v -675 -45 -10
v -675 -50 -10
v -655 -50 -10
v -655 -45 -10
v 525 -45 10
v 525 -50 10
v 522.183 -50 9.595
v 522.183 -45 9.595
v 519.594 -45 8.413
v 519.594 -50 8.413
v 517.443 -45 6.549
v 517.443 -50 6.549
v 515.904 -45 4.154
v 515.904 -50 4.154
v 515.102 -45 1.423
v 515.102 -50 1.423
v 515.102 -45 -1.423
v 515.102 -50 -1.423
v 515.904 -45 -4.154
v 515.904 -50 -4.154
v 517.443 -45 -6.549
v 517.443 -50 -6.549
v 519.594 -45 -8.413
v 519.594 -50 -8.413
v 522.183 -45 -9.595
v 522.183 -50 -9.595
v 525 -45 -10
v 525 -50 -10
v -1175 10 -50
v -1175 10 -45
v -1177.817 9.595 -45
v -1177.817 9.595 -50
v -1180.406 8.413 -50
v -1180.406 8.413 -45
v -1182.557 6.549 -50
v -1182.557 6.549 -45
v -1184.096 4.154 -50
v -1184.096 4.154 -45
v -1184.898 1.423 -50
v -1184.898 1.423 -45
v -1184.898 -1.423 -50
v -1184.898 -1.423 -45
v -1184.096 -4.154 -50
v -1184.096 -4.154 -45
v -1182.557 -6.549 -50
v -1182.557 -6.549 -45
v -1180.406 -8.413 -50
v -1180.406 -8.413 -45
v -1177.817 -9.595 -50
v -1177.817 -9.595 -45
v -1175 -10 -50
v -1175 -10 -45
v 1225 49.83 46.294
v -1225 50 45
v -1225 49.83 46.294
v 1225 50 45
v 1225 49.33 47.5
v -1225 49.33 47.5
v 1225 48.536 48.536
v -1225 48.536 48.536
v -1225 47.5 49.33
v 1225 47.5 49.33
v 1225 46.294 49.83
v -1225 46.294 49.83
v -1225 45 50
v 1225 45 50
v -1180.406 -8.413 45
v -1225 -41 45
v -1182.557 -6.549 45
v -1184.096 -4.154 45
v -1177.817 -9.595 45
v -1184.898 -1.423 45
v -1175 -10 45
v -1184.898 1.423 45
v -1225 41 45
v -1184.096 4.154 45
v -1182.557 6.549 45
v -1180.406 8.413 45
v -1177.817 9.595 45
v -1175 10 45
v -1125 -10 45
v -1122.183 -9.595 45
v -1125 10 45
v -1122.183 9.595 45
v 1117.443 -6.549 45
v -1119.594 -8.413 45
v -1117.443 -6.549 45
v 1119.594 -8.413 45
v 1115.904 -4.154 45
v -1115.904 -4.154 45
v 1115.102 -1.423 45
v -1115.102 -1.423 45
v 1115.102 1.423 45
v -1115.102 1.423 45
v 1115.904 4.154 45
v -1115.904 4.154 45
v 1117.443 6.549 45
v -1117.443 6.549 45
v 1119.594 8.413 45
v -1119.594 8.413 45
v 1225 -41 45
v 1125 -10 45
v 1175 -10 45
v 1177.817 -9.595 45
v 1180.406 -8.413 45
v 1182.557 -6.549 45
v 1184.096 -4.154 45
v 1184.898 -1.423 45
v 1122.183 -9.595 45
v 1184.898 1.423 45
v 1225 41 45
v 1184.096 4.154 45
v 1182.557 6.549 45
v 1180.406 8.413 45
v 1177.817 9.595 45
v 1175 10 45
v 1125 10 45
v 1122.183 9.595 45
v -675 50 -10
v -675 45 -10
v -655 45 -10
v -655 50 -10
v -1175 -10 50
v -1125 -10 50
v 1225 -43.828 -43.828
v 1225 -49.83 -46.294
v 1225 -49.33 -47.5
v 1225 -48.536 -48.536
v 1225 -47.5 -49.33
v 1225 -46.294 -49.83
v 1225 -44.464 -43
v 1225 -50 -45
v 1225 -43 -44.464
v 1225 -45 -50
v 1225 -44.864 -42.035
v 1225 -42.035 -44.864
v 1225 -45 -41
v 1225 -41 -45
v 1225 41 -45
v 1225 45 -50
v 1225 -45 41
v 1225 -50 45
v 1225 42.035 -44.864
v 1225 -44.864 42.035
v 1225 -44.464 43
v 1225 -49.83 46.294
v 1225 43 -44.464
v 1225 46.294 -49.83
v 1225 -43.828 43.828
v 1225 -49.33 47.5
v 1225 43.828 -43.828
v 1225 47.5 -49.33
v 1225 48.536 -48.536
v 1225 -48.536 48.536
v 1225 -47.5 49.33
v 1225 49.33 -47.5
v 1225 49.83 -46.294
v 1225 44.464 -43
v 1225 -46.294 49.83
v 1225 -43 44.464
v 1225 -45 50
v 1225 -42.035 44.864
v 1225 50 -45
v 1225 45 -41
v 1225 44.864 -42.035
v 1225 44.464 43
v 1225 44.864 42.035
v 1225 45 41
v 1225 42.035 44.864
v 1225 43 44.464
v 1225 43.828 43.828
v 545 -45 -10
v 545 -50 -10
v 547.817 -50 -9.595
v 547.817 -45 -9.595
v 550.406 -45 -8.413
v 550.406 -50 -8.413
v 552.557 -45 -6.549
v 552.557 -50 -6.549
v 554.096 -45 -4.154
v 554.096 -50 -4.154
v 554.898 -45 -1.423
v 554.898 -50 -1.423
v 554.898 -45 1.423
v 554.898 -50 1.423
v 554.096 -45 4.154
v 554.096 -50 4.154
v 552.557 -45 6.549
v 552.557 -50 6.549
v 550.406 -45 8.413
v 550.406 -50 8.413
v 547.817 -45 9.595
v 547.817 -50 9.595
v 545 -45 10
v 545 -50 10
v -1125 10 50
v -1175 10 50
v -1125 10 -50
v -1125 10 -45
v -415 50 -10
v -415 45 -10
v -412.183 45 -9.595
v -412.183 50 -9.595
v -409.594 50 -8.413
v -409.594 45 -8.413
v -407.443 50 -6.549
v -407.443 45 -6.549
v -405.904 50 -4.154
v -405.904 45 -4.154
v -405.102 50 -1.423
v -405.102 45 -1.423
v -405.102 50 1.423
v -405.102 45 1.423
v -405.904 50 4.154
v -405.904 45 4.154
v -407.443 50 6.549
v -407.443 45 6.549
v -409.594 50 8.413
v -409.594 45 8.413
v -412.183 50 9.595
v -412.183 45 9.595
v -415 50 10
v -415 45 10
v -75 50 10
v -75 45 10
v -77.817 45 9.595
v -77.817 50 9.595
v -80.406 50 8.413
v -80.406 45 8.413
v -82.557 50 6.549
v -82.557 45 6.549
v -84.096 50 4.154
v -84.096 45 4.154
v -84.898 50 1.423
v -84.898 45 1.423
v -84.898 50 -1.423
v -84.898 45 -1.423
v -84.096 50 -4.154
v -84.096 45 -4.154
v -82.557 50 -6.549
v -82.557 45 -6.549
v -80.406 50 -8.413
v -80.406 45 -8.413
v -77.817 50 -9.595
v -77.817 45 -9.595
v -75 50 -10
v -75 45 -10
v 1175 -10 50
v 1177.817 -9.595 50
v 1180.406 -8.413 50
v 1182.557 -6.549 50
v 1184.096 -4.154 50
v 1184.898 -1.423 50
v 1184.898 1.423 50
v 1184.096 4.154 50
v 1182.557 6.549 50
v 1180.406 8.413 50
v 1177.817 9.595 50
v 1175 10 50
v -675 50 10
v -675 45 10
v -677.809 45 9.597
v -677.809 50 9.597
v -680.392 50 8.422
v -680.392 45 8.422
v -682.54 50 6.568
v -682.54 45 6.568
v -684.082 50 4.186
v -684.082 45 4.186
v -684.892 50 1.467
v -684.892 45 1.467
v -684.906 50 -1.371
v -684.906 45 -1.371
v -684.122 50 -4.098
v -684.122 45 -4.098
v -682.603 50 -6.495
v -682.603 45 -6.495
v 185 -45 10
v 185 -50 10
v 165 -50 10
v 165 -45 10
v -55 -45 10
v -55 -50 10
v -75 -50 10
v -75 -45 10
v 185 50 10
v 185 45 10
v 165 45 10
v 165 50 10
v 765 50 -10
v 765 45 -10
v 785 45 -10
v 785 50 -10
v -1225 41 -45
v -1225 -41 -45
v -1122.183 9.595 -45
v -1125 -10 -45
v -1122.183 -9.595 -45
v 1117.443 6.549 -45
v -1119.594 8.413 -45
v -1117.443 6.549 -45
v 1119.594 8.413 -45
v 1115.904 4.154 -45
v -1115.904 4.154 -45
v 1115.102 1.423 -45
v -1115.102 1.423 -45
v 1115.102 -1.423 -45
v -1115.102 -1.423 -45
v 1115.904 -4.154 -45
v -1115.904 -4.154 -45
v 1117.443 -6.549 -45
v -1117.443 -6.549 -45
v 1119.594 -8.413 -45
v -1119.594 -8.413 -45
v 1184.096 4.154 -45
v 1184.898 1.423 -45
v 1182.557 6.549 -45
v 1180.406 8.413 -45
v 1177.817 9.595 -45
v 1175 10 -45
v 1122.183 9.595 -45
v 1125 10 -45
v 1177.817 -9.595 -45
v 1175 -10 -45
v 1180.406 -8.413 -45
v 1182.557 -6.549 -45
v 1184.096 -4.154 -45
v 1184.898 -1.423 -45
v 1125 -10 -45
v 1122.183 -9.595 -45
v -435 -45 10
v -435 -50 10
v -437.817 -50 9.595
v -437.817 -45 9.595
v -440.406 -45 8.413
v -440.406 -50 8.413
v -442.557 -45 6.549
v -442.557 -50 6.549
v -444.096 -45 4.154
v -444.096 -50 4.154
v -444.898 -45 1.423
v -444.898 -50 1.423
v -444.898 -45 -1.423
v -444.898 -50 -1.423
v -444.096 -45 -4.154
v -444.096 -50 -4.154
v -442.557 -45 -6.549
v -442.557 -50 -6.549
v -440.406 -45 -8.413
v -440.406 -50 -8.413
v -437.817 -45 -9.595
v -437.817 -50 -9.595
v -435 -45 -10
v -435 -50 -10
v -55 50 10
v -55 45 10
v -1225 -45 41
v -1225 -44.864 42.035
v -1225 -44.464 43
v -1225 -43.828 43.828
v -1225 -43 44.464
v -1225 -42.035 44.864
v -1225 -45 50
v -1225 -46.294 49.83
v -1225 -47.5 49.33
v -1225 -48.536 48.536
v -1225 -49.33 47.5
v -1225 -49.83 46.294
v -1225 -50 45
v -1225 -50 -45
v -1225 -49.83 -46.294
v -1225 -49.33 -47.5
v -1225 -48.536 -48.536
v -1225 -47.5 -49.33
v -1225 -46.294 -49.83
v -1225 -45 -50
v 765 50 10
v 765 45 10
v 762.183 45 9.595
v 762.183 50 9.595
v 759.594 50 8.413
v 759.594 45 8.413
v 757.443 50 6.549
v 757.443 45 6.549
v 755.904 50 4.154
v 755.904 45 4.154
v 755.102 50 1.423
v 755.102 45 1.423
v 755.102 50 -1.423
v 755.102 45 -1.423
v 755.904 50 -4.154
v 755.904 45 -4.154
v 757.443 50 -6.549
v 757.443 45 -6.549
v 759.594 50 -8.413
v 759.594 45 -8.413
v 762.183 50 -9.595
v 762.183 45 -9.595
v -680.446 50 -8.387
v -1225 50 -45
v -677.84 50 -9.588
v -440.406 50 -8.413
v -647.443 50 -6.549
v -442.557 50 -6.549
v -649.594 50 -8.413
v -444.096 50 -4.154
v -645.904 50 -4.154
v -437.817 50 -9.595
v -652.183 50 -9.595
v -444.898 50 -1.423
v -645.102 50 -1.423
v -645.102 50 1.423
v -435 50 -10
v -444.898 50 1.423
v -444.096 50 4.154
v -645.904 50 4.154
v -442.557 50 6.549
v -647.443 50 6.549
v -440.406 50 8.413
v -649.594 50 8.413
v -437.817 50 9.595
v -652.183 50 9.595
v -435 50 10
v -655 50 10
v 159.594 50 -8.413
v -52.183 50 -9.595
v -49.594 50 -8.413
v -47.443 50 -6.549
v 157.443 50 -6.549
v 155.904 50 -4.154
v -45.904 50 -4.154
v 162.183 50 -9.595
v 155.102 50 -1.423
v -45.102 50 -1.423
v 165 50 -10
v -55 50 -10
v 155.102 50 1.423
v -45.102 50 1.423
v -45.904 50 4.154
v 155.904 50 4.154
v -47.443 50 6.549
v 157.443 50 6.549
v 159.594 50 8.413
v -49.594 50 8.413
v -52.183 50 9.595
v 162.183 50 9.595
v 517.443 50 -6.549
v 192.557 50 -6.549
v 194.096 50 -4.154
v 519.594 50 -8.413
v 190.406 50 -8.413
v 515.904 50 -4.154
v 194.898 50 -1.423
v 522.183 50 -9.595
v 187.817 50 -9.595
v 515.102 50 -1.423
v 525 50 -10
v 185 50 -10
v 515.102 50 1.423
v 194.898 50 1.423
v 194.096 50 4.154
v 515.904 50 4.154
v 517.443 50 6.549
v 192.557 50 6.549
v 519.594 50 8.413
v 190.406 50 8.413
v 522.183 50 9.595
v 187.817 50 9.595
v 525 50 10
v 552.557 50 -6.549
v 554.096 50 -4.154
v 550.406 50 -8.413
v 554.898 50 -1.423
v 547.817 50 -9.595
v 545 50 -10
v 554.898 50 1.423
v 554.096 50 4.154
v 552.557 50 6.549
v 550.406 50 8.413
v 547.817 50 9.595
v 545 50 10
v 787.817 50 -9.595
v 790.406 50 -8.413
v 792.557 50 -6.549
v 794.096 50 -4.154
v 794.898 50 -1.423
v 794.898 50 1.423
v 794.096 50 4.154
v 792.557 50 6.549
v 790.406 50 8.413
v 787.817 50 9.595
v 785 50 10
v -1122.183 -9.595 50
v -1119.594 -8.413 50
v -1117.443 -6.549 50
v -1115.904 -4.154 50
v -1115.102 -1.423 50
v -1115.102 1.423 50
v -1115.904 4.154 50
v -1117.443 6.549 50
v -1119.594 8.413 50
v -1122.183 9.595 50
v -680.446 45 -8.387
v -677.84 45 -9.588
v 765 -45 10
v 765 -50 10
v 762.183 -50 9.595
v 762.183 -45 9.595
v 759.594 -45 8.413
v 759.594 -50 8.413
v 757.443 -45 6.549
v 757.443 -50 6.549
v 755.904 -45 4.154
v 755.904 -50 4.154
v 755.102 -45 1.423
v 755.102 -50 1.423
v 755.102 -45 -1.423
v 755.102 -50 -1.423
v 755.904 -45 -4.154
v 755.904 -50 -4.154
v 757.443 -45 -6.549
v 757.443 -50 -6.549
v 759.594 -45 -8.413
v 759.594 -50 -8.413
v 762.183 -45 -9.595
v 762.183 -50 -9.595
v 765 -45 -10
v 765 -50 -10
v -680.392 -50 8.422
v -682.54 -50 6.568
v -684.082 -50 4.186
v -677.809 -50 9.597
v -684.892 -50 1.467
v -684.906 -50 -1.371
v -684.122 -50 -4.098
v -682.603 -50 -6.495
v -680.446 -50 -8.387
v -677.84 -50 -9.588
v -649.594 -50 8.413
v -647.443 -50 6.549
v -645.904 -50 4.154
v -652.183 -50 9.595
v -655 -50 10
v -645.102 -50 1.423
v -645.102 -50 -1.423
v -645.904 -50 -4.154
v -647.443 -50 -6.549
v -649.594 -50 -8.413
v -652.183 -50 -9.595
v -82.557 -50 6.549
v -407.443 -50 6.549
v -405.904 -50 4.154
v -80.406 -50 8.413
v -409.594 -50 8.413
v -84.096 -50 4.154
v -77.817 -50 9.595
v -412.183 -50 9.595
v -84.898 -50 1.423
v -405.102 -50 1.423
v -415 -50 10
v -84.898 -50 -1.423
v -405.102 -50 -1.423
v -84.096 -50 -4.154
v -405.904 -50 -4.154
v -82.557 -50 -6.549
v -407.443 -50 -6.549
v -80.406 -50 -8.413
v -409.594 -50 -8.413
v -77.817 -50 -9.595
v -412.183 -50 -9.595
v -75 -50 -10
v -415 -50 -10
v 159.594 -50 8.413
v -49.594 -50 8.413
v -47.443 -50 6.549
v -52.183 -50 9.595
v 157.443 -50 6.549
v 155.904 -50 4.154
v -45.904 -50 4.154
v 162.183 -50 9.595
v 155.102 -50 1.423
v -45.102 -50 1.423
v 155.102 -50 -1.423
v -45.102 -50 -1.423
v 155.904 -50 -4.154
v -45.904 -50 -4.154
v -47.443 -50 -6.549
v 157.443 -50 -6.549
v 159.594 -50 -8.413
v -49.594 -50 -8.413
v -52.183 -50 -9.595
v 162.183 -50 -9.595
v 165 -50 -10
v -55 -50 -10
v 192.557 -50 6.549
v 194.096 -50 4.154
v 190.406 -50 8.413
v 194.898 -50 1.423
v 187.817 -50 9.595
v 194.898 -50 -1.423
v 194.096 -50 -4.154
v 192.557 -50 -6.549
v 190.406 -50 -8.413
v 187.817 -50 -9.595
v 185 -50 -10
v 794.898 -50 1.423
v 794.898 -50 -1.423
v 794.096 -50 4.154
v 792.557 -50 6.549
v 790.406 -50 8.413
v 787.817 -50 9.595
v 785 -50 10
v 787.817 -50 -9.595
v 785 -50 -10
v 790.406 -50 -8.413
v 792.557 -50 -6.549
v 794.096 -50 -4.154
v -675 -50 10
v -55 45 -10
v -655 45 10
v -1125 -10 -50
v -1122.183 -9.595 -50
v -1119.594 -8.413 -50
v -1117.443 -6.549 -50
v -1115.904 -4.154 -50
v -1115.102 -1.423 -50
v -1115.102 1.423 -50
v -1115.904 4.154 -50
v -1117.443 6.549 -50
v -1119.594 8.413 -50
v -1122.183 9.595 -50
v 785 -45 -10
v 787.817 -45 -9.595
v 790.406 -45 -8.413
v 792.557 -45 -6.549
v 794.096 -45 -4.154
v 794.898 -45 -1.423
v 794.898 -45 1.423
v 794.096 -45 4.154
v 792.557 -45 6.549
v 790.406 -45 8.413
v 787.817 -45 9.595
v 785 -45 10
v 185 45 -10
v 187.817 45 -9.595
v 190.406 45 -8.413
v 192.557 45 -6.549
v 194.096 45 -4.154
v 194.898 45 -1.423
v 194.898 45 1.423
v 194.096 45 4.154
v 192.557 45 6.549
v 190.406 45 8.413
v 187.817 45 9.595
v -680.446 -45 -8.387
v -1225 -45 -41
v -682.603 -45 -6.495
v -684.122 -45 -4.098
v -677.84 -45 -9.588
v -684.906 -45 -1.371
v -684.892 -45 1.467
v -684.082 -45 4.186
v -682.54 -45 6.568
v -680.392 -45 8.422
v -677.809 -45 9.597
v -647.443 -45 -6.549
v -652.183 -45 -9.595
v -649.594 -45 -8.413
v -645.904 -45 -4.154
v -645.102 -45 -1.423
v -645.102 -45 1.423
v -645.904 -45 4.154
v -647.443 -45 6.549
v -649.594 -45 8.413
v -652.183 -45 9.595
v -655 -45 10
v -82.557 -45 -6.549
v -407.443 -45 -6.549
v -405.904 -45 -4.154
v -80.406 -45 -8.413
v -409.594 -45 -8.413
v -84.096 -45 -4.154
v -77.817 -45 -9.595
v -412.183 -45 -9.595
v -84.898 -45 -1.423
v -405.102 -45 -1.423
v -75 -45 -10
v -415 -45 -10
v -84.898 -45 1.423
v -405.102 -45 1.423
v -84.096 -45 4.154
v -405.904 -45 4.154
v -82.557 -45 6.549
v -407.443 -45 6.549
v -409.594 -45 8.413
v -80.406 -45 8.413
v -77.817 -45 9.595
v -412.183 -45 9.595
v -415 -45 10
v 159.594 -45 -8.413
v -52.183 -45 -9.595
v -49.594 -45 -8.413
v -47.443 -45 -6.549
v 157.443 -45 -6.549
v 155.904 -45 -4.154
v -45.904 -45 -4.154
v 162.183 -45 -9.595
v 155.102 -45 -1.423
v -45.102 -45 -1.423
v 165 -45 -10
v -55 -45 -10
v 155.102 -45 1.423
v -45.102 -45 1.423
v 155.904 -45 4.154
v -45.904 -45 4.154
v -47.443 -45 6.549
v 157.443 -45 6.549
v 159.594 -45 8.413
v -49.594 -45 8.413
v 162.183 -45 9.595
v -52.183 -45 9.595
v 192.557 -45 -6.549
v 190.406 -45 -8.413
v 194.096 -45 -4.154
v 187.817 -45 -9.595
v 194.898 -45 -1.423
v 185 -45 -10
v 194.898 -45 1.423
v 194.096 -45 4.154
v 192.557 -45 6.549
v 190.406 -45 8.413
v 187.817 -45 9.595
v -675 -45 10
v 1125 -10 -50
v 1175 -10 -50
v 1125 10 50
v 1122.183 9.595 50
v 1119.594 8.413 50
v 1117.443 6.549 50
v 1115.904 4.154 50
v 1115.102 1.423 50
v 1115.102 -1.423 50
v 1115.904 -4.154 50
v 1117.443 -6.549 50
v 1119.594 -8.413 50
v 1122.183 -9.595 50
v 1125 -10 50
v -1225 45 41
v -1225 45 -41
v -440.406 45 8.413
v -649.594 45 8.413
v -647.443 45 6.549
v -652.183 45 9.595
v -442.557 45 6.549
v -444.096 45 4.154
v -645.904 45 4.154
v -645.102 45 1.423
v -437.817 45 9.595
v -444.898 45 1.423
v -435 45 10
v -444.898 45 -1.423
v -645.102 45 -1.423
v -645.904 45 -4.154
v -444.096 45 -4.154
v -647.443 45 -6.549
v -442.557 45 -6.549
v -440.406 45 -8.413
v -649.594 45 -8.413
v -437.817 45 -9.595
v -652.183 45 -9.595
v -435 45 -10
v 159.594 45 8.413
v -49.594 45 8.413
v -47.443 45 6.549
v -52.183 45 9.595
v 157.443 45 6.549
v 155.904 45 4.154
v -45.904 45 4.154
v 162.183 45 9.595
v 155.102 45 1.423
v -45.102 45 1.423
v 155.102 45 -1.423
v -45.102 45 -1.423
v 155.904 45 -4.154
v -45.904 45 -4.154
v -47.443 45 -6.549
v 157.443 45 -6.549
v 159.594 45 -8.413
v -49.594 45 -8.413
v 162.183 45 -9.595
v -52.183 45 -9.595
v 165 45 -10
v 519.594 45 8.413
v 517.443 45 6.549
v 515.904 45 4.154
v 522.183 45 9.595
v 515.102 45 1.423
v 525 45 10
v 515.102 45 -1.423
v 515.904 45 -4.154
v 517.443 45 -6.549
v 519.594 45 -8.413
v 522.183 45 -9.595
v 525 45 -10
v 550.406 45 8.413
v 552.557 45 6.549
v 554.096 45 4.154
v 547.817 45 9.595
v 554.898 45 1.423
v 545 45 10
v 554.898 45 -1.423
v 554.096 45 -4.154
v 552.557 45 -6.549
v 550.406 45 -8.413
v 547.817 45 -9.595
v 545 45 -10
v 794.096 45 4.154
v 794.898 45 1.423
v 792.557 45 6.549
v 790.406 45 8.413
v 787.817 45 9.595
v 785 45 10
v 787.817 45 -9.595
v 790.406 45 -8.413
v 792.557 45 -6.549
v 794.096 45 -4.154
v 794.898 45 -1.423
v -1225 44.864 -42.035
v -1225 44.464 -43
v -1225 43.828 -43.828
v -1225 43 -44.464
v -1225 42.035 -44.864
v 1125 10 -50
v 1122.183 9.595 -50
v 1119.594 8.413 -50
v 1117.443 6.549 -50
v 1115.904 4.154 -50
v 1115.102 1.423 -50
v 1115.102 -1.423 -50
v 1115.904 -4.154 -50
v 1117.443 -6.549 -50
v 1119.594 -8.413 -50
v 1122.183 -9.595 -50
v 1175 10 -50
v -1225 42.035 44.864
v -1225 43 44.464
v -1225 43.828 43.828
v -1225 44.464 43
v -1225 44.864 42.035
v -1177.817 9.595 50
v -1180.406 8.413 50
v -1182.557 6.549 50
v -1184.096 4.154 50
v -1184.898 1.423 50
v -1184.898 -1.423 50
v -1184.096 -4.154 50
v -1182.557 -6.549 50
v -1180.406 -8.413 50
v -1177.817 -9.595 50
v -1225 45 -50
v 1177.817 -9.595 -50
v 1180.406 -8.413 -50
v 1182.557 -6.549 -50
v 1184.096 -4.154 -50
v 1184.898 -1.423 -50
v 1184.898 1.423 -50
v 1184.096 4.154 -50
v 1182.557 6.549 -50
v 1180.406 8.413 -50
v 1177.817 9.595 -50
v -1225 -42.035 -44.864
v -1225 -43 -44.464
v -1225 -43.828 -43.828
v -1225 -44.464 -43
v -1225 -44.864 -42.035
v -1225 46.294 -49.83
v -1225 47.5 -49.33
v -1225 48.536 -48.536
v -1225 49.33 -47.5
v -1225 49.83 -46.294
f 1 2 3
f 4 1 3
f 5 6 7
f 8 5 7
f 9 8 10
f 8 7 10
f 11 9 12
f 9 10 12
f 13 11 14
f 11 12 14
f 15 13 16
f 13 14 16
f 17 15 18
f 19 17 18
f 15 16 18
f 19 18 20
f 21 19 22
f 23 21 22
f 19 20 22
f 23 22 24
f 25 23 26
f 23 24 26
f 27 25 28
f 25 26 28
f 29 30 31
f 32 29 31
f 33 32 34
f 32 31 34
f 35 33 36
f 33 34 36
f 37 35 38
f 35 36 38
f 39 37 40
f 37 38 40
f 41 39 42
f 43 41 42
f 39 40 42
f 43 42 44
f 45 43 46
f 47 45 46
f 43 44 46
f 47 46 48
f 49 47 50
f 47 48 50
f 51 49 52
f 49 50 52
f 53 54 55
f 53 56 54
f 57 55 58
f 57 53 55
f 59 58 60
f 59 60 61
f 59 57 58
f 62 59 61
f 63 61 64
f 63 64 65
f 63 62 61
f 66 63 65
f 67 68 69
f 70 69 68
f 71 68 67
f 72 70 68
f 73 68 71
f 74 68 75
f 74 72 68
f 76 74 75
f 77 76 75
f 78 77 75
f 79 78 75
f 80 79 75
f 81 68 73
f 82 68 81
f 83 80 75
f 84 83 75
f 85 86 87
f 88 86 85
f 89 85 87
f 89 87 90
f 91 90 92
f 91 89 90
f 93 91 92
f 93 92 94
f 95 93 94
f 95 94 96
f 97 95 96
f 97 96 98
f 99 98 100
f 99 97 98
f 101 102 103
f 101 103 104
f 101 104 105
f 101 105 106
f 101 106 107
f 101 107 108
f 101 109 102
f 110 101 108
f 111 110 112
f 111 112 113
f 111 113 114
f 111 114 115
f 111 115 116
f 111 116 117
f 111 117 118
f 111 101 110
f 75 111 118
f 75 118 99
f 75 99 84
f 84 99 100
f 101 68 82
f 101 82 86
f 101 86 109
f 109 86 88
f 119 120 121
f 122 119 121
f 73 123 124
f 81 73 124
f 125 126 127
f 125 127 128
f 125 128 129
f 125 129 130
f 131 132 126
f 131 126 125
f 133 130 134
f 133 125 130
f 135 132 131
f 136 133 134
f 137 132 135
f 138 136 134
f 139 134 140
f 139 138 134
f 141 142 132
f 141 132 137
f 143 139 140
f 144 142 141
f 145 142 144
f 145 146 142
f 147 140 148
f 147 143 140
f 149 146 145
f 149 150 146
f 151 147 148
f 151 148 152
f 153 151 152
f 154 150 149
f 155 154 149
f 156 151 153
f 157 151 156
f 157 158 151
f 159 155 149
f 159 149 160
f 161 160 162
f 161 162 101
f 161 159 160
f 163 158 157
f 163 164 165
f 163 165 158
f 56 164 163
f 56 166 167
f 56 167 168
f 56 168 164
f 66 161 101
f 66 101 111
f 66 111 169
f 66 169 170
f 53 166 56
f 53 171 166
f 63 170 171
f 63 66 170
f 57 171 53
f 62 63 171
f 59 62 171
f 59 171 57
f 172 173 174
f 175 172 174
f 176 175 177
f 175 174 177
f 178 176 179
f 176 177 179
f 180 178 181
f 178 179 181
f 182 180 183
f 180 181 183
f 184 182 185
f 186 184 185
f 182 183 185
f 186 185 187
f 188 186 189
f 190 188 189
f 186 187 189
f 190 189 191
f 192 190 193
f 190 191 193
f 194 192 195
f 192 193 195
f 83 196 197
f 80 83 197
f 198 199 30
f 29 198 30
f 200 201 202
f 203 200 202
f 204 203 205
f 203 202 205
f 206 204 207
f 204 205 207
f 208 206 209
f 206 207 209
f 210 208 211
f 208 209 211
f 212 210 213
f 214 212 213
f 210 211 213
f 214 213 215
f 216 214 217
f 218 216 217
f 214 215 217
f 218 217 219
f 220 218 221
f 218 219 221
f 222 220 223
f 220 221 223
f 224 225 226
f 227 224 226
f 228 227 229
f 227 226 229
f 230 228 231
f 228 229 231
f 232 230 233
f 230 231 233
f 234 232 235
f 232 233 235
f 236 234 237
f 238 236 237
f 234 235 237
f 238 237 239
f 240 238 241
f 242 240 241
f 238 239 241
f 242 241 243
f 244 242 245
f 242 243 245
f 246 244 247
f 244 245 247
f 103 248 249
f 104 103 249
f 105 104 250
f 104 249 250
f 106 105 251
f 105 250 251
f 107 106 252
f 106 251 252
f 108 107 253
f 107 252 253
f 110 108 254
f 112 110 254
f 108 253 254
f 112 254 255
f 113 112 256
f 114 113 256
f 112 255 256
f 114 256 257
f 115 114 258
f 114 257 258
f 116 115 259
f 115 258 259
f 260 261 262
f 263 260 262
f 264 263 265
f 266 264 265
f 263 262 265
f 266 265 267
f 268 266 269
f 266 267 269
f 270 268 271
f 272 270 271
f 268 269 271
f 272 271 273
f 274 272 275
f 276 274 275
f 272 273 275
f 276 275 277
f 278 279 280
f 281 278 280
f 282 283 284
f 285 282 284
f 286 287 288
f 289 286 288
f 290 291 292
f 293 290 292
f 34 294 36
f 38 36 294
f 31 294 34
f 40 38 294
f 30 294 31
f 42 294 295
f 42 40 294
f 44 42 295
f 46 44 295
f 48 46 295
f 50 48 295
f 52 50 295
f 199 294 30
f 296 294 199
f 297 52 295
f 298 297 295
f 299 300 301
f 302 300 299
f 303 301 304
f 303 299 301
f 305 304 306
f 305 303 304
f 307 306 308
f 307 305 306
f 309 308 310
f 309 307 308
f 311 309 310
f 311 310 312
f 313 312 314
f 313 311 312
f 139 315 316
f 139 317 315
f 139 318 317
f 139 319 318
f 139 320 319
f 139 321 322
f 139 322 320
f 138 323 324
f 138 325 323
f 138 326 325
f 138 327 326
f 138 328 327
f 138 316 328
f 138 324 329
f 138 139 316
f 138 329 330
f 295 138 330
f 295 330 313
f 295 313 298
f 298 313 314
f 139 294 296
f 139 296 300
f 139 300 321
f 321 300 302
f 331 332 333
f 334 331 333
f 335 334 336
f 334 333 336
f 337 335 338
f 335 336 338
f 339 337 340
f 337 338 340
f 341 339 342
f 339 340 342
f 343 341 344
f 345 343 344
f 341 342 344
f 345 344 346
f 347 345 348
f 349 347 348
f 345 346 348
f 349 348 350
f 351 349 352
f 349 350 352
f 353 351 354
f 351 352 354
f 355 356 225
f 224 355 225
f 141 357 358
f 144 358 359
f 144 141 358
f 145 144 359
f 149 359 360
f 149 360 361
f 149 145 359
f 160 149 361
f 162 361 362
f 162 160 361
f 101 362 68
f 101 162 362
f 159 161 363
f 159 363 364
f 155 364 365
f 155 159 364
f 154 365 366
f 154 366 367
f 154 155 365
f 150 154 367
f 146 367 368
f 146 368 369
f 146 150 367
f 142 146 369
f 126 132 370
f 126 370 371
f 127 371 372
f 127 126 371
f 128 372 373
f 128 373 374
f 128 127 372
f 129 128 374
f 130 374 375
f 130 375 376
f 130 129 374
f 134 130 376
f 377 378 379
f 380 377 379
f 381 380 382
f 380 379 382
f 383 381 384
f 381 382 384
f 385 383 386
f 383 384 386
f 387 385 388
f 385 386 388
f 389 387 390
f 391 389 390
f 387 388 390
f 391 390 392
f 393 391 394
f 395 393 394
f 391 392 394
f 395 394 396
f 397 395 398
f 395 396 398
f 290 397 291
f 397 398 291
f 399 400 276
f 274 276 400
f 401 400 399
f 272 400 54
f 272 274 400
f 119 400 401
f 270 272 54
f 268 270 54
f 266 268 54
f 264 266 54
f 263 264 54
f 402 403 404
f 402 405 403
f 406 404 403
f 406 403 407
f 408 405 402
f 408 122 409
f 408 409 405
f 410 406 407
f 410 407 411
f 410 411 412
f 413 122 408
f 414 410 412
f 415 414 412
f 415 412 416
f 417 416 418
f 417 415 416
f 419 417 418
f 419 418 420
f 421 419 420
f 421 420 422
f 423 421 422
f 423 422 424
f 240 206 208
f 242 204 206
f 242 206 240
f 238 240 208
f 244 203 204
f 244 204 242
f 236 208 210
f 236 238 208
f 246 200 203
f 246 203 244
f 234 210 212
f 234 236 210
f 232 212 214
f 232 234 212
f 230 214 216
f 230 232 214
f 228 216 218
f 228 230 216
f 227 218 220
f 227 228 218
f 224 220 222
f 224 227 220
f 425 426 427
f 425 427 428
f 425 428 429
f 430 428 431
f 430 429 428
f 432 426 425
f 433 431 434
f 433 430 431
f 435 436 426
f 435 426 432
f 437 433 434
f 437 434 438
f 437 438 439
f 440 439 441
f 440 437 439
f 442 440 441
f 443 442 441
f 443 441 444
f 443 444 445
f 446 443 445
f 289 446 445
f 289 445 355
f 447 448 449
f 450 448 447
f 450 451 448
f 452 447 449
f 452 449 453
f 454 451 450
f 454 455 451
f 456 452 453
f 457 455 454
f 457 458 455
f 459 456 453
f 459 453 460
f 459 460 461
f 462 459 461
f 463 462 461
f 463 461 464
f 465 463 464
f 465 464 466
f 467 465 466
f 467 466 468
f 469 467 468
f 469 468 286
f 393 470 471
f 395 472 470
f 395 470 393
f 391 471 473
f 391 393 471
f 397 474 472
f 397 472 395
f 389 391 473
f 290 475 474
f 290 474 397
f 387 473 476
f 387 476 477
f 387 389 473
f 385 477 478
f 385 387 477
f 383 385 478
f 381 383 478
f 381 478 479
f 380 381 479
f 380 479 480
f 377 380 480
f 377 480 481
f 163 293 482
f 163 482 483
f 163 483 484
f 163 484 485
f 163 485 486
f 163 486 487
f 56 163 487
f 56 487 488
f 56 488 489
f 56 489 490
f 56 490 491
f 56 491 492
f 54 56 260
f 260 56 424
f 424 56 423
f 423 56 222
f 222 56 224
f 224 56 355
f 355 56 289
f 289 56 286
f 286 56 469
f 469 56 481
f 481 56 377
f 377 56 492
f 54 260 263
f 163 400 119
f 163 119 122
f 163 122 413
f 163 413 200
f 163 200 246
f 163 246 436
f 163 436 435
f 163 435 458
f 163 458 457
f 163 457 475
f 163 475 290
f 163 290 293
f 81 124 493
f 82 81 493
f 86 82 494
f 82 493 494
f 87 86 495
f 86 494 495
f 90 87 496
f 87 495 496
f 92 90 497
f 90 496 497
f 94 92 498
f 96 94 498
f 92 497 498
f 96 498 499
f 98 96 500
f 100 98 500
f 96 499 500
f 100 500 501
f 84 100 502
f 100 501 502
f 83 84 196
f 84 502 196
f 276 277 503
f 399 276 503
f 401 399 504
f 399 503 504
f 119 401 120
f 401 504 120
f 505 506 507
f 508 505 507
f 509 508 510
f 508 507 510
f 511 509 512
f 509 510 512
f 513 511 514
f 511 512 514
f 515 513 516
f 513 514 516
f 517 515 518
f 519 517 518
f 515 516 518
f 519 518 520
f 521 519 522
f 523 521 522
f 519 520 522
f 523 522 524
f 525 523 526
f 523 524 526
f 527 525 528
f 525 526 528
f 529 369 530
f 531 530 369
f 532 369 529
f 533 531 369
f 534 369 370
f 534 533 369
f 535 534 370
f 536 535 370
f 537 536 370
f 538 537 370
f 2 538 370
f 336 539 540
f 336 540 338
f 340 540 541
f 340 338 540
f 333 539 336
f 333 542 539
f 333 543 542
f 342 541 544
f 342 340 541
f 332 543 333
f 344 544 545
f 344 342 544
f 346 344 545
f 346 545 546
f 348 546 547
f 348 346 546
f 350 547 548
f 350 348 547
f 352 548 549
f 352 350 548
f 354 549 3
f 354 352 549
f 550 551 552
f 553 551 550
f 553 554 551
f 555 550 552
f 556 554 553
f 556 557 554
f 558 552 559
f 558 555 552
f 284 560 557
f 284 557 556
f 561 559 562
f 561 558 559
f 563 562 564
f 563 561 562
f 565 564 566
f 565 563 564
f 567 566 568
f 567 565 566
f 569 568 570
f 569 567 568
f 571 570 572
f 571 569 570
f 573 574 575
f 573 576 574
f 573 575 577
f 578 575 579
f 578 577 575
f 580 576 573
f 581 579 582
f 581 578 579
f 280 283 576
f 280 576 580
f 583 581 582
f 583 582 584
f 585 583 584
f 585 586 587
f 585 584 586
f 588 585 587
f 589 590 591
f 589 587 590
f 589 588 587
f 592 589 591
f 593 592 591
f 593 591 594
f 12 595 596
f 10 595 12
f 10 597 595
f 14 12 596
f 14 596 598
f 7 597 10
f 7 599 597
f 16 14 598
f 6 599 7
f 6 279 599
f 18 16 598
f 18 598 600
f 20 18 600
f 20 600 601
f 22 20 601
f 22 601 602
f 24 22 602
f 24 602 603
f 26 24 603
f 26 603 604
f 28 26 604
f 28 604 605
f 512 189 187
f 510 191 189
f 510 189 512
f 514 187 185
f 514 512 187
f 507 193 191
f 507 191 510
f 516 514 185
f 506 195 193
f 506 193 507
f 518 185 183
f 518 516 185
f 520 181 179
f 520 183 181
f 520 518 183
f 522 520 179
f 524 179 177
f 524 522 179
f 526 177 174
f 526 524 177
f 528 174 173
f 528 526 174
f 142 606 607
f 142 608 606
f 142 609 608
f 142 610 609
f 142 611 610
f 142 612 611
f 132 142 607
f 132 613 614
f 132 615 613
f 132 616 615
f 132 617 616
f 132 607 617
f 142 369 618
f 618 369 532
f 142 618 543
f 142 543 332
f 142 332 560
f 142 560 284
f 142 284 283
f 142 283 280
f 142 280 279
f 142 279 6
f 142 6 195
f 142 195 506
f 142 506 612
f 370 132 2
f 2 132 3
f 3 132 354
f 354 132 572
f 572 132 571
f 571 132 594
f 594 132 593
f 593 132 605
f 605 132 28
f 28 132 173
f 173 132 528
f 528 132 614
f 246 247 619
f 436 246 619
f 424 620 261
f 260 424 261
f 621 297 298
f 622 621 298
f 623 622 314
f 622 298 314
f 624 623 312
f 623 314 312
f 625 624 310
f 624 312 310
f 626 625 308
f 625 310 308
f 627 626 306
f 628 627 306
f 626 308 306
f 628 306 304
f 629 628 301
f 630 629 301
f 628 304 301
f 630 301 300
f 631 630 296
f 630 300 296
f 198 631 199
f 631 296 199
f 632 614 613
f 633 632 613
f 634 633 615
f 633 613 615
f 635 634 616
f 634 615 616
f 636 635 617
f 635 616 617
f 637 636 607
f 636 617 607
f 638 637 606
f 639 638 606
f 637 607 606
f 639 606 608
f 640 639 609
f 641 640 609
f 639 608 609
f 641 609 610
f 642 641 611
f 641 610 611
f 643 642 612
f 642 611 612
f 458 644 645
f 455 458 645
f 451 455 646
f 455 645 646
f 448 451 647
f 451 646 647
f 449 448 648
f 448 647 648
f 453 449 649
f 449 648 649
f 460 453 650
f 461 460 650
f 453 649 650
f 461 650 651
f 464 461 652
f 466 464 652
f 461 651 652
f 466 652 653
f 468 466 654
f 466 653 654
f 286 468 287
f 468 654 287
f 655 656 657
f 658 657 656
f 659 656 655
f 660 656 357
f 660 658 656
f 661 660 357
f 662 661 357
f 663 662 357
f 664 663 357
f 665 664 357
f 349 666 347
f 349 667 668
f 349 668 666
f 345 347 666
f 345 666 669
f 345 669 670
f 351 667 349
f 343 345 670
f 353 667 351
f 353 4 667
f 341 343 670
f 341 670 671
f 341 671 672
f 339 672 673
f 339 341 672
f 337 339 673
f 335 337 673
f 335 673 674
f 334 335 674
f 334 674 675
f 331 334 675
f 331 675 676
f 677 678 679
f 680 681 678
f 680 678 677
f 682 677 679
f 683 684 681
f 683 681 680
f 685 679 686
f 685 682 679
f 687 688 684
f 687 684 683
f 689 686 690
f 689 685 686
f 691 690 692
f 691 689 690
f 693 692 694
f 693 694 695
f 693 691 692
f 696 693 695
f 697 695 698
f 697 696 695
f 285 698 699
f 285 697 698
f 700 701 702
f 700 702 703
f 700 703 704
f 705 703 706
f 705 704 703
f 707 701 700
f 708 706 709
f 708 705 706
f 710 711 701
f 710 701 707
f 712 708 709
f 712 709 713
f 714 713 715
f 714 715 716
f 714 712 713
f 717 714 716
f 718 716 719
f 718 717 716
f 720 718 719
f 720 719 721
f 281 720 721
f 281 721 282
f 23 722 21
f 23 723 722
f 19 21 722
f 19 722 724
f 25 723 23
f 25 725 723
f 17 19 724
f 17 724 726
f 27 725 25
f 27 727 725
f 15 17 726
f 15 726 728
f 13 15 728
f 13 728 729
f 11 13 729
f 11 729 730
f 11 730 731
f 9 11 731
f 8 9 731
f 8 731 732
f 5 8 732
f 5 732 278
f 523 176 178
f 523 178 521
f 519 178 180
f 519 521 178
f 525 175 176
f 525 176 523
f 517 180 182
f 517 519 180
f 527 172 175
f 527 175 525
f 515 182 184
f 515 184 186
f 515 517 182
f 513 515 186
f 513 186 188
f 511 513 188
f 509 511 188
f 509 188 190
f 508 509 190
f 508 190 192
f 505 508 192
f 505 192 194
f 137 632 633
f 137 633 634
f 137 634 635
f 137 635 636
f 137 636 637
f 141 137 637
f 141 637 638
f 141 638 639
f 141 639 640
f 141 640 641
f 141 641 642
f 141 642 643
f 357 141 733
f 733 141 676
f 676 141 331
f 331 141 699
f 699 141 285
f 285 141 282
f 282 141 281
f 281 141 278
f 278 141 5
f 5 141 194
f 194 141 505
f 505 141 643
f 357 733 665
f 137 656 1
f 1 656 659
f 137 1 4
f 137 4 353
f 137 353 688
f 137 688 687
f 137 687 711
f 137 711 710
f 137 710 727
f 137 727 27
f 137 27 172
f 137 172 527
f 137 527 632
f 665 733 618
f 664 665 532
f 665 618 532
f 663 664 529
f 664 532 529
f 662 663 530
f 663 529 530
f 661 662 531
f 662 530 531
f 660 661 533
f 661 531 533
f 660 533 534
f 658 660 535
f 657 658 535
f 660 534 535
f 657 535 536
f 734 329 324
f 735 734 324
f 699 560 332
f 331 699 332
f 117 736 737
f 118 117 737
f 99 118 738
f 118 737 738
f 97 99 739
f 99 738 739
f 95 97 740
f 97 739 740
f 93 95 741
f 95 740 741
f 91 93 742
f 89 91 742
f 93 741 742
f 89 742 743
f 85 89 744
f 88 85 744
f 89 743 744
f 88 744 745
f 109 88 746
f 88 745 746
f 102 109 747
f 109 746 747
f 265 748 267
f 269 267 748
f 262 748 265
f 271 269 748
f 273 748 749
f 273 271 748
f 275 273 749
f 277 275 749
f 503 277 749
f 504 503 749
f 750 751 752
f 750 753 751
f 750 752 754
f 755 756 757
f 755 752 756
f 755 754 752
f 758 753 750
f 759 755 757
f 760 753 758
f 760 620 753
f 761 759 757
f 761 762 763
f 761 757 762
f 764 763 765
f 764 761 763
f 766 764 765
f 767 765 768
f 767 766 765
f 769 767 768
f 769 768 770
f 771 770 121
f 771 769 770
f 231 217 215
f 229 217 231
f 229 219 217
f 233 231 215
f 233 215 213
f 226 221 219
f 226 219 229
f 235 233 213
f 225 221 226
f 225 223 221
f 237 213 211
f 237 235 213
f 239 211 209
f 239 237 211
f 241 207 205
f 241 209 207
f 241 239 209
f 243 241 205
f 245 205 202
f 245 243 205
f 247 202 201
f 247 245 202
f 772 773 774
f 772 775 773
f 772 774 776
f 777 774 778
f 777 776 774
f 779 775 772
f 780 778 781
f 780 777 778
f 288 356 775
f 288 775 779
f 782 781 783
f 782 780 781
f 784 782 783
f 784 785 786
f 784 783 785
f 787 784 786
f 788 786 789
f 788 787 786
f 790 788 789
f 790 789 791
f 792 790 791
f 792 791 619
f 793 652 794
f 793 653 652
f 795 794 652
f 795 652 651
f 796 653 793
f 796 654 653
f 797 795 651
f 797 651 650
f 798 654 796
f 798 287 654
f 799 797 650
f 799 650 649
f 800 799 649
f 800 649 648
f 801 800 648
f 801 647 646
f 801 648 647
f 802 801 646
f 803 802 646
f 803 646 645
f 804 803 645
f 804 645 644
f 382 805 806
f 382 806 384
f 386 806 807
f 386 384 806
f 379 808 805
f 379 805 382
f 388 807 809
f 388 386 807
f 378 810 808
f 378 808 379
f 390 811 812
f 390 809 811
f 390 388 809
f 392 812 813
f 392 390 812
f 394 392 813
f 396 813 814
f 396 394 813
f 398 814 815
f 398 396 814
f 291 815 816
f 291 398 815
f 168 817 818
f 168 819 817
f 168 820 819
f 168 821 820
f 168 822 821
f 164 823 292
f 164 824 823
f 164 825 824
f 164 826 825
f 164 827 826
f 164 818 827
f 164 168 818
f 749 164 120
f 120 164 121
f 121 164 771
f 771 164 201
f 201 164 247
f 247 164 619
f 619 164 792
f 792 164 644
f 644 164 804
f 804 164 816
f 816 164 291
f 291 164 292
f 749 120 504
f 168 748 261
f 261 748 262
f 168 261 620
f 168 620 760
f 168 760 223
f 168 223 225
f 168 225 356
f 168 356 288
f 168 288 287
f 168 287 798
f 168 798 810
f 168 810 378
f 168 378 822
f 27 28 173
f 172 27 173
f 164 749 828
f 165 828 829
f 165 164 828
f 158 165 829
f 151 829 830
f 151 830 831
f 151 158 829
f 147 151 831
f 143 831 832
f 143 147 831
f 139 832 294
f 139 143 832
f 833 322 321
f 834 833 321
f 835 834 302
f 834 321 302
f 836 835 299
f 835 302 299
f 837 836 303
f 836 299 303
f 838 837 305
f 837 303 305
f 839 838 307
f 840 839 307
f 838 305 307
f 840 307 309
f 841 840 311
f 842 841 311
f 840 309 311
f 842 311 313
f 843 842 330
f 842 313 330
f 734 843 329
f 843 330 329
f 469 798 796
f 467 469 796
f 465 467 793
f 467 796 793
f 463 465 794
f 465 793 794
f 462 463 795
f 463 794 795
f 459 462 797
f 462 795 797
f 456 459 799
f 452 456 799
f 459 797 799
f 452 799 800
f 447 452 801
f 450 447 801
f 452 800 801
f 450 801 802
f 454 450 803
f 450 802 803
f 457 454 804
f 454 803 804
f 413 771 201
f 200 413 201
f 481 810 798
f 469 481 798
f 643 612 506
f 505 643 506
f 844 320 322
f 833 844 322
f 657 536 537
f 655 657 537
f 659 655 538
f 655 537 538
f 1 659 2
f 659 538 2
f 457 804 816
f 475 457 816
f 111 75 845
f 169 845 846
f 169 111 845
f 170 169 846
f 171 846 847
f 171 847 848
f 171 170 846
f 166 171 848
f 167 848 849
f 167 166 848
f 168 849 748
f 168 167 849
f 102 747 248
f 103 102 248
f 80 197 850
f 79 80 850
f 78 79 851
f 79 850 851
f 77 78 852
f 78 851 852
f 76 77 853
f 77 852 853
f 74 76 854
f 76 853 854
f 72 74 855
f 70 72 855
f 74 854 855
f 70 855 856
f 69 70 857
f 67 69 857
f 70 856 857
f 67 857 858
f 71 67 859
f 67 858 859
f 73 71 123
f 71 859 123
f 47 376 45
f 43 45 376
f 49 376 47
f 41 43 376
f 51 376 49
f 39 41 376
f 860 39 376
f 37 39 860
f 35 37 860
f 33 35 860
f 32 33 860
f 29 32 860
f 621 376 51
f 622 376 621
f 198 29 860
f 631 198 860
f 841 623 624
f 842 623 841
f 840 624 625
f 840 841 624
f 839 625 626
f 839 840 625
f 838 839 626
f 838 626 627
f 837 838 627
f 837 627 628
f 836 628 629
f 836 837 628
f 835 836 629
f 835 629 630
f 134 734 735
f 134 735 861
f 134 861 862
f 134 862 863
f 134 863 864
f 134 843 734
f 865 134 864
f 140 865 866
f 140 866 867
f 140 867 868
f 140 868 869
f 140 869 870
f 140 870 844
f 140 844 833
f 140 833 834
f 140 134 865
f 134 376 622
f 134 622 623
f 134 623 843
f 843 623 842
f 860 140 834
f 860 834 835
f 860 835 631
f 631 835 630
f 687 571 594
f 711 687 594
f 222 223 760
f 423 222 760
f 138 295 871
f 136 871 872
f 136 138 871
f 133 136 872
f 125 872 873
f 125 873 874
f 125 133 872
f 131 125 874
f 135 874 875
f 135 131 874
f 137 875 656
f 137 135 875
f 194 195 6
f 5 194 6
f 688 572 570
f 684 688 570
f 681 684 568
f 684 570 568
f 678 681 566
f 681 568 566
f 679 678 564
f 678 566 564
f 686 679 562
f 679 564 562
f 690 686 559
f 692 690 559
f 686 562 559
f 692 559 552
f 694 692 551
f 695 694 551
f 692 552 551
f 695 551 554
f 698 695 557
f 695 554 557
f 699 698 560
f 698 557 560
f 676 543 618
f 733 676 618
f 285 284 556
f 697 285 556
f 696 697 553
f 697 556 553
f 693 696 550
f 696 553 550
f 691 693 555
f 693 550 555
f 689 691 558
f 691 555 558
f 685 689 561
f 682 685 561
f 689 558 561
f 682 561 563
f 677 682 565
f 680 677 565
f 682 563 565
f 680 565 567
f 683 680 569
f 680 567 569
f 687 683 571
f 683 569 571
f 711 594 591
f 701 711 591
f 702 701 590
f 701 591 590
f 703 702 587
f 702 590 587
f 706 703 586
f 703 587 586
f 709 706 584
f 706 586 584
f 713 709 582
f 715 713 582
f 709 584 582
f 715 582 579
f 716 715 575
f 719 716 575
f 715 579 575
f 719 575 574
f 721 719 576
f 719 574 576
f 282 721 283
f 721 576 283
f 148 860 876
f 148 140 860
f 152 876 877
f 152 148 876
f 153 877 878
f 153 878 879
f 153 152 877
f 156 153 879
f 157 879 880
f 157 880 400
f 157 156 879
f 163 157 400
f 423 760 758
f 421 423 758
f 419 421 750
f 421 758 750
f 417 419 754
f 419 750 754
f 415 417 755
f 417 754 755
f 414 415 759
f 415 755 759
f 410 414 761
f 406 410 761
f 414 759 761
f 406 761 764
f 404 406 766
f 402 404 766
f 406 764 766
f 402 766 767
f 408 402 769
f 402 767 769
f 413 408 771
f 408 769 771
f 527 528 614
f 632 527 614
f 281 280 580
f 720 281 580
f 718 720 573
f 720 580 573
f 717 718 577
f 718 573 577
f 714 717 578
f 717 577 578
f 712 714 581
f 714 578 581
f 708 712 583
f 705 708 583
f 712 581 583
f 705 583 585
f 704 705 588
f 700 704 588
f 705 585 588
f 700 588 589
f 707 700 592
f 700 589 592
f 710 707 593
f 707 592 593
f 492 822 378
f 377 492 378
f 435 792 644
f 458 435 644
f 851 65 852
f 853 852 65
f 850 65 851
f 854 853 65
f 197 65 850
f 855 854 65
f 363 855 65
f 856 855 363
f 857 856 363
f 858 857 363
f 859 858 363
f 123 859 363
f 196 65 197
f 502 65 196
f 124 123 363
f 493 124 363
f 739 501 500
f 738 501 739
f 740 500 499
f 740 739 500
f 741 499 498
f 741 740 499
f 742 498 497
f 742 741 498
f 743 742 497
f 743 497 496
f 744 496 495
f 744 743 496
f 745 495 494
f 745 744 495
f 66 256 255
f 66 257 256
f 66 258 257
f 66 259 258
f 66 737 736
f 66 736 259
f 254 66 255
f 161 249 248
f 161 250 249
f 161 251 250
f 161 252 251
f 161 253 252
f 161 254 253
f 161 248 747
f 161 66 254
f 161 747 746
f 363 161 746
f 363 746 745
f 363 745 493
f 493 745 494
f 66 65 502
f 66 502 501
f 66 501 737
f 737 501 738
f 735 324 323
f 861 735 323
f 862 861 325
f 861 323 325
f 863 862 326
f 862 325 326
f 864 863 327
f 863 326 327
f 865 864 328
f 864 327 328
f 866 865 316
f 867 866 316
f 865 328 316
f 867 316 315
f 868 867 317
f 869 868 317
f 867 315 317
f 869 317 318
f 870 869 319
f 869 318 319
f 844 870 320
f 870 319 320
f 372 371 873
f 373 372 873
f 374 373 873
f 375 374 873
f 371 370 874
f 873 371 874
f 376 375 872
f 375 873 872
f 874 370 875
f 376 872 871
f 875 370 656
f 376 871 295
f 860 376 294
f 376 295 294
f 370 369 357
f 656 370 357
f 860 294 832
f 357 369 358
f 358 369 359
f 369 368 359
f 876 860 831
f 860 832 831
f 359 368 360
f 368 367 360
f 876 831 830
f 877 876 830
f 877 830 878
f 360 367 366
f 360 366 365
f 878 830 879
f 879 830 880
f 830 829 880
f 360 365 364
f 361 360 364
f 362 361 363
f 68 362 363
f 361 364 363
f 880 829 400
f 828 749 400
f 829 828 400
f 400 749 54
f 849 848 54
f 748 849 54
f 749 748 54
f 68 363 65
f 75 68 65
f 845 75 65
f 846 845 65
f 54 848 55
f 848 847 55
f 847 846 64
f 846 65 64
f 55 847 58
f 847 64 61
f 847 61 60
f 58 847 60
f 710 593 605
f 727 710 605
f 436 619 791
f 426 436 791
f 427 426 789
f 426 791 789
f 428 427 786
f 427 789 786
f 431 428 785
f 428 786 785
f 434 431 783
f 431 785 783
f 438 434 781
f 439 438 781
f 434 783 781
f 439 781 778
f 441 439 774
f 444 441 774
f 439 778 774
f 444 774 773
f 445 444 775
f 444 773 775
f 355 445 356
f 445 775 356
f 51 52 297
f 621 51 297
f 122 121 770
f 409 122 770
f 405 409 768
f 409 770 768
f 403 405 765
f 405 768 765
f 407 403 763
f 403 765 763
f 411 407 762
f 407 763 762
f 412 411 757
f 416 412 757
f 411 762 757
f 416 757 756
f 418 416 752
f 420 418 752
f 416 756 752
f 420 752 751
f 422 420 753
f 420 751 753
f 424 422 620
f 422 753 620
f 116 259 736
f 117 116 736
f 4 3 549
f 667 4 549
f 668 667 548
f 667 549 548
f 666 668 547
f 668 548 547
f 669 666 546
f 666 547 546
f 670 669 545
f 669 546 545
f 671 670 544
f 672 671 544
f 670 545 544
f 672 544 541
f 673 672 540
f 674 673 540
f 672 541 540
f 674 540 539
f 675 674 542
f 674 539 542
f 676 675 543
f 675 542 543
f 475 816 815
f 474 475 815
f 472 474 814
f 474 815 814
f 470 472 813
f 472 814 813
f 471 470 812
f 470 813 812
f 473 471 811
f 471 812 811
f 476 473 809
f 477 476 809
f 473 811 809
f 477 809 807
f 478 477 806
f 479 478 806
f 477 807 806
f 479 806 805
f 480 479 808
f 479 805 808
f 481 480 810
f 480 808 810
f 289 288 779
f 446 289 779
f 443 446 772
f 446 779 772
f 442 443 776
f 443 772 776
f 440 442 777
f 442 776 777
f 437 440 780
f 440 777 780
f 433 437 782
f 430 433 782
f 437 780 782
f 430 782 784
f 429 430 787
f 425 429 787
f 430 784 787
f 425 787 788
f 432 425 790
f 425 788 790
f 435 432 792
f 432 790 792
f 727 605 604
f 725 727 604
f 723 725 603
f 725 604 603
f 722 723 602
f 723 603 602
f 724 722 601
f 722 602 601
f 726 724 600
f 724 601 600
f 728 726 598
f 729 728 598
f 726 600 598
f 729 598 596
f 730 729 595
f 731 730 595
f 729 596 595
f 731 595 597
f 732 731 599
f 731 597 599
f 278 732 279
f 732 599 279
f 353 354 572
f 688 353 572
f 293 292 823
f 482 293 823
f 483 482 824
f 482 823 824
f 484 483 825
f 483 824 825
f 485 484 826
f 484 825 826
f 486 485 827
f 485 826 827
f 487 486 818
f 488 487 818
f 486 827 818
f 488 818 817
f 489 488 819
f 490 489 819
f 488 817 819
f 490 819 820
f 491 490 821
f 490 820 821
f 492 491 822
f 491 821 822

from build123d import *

# Parameters (mm, degrees)
F1_DEPTH = 1225
F3_DEPTH = 100.001
F5_DEPTH = 100.001


with BuildPart() as f1:
    # F0 (on Right) → F1 (new body, symmetric)
    with BuildSketch(Plane.YZ):
        with BuildLine():
            Line((45, 50), (-45, 50))
            ThreePointArc((-45, 50), (-48.535534, 48.535534), (-50, 45))
            Line((-50, 45), (-50, -45))
            ThreePointArc((-50, -45), (-48.535534, -48.535534), (-45, -50))
            Line((-45, -50), (45, -50))
            ThreePointArc((45, -50), (48.535534, -48.535534), (50, -45))
            Line((50, -45), (50, 45))
            ThreePointArc((50, 45), (48.535534, 48.535534), (45, 50))
        make_face()
        with BuildLine():
            ThreePointArc((-45, 41), (-43.828427, 43.828427), (-41, 45))
            Line((-41, 45), (41, 45))
            ThreePointArc((41, 45), (43.828427, 43.828427), (45, 41))
            Line((45, 41), (45, -41))
            ThreePointArc((45, -41), (43.828427, -43.828427), (41, -45))
            Line((41, -45), (-41, -45))
            ThreePointArc((-41, -45), (-43.828427, -43.828427), (-45, -41))
            Line((-45, -41), (-45, 41))
        make_face(mode=Mode.SUBTRACT)
    extrude(amount=F1_DEPTH, both=True)

    # F2 (on face) → F3 (cut, through all)
    with BuildSketch(Plane.XZ.offset(50)):
        with BuildLine():
            ThreePointArc((-675, 10), (-684.081679, 4.186061), (-682.603293, -6.495378))
            ThreePointArc((-682.603293, -6.495378), (-679.186061, -9.081679), (-675, -10))
            Line((-675, -10), (-655, -10))
            ThreePointArc((-655, -10), (-645, 0), (-655, 10))
            Line((-655, 10), (-675, 10))
        make_face()
        with BuildLine():
            Line((-415, 10), (-435, 10))
            ThreePointArc((-435, 10), (-445, 0), (-435, -10))
            Line((-435, -10), (-415, -10))
            ThreePointArc((-415, -10), (-405, 0), (-415, 10))
        make_face()
        with BuildLine():
            Line((-55, 10), (-75, 10))
            ThreePointArc((-75, 10), (-85, 0), (-75, -10))
            Line((-75, -10), (-55, -10))
            ThreePointArc((-55, -10), (-45, 0), (-55, 10))
        make_face()
        with BuildLine():
            Line((165, -10), (185, -10))
            ThreePointArc((185, -10), (195, 0), (185, 10))
            Line((185, 10), (165, 10))
            ThreePointArc((165, 10), (155, 0), (165, -10))
        make_face()
        with BuildLine():
            Line((545, 10), (525, 10))
            ThreePointArc((525, 10), (515, 0), (525, -10))
            Line((525, -10), (545, -10))
            ThreePointArc((545, -10), (555, 0), (545, 10))
        make_face()
        with BuildLine():
            Line((785, 10), (765, 10))
            ThreePointArc((765, 10), (755, 0), (765, -10))
            Line((765, -10), (785, -10))
            ThreePointArc((785, -10), (795, 0), (785, 10))
        make_face()
    extrude(amount=-F3_DEPTH, mode=Mode.SUBTRACT)

    # F4 (on face) → F5 (cut, through all)
    with BuildSketch(Plane.XY.offset(50)):
        with BuildLine():
            Line((-1125, 10), (-1175, 10))
            ThreePointArc((-1175, 10), (-1185, 0), (-1175, -10))
            Line((-1175, -10), (-1125, -10))
            ThreePointArc((-1125, -10), (-1115, 0), (-1125, 10))
        make_face()
        with BuildLine():
            ThreePointArc((1175, -10), (1185, 0), (1175, 10))
            Line((1175, 10), (1125, 10))
            ThreePointArc((1125, 10), (1115, 0), (1125, -10))
            Line((1125, -10), (1175, -10))
        make_face()
    extrude(amount=-F5_DEPTH, mode=Mode.SUBTRACT)


solid = f1.part
